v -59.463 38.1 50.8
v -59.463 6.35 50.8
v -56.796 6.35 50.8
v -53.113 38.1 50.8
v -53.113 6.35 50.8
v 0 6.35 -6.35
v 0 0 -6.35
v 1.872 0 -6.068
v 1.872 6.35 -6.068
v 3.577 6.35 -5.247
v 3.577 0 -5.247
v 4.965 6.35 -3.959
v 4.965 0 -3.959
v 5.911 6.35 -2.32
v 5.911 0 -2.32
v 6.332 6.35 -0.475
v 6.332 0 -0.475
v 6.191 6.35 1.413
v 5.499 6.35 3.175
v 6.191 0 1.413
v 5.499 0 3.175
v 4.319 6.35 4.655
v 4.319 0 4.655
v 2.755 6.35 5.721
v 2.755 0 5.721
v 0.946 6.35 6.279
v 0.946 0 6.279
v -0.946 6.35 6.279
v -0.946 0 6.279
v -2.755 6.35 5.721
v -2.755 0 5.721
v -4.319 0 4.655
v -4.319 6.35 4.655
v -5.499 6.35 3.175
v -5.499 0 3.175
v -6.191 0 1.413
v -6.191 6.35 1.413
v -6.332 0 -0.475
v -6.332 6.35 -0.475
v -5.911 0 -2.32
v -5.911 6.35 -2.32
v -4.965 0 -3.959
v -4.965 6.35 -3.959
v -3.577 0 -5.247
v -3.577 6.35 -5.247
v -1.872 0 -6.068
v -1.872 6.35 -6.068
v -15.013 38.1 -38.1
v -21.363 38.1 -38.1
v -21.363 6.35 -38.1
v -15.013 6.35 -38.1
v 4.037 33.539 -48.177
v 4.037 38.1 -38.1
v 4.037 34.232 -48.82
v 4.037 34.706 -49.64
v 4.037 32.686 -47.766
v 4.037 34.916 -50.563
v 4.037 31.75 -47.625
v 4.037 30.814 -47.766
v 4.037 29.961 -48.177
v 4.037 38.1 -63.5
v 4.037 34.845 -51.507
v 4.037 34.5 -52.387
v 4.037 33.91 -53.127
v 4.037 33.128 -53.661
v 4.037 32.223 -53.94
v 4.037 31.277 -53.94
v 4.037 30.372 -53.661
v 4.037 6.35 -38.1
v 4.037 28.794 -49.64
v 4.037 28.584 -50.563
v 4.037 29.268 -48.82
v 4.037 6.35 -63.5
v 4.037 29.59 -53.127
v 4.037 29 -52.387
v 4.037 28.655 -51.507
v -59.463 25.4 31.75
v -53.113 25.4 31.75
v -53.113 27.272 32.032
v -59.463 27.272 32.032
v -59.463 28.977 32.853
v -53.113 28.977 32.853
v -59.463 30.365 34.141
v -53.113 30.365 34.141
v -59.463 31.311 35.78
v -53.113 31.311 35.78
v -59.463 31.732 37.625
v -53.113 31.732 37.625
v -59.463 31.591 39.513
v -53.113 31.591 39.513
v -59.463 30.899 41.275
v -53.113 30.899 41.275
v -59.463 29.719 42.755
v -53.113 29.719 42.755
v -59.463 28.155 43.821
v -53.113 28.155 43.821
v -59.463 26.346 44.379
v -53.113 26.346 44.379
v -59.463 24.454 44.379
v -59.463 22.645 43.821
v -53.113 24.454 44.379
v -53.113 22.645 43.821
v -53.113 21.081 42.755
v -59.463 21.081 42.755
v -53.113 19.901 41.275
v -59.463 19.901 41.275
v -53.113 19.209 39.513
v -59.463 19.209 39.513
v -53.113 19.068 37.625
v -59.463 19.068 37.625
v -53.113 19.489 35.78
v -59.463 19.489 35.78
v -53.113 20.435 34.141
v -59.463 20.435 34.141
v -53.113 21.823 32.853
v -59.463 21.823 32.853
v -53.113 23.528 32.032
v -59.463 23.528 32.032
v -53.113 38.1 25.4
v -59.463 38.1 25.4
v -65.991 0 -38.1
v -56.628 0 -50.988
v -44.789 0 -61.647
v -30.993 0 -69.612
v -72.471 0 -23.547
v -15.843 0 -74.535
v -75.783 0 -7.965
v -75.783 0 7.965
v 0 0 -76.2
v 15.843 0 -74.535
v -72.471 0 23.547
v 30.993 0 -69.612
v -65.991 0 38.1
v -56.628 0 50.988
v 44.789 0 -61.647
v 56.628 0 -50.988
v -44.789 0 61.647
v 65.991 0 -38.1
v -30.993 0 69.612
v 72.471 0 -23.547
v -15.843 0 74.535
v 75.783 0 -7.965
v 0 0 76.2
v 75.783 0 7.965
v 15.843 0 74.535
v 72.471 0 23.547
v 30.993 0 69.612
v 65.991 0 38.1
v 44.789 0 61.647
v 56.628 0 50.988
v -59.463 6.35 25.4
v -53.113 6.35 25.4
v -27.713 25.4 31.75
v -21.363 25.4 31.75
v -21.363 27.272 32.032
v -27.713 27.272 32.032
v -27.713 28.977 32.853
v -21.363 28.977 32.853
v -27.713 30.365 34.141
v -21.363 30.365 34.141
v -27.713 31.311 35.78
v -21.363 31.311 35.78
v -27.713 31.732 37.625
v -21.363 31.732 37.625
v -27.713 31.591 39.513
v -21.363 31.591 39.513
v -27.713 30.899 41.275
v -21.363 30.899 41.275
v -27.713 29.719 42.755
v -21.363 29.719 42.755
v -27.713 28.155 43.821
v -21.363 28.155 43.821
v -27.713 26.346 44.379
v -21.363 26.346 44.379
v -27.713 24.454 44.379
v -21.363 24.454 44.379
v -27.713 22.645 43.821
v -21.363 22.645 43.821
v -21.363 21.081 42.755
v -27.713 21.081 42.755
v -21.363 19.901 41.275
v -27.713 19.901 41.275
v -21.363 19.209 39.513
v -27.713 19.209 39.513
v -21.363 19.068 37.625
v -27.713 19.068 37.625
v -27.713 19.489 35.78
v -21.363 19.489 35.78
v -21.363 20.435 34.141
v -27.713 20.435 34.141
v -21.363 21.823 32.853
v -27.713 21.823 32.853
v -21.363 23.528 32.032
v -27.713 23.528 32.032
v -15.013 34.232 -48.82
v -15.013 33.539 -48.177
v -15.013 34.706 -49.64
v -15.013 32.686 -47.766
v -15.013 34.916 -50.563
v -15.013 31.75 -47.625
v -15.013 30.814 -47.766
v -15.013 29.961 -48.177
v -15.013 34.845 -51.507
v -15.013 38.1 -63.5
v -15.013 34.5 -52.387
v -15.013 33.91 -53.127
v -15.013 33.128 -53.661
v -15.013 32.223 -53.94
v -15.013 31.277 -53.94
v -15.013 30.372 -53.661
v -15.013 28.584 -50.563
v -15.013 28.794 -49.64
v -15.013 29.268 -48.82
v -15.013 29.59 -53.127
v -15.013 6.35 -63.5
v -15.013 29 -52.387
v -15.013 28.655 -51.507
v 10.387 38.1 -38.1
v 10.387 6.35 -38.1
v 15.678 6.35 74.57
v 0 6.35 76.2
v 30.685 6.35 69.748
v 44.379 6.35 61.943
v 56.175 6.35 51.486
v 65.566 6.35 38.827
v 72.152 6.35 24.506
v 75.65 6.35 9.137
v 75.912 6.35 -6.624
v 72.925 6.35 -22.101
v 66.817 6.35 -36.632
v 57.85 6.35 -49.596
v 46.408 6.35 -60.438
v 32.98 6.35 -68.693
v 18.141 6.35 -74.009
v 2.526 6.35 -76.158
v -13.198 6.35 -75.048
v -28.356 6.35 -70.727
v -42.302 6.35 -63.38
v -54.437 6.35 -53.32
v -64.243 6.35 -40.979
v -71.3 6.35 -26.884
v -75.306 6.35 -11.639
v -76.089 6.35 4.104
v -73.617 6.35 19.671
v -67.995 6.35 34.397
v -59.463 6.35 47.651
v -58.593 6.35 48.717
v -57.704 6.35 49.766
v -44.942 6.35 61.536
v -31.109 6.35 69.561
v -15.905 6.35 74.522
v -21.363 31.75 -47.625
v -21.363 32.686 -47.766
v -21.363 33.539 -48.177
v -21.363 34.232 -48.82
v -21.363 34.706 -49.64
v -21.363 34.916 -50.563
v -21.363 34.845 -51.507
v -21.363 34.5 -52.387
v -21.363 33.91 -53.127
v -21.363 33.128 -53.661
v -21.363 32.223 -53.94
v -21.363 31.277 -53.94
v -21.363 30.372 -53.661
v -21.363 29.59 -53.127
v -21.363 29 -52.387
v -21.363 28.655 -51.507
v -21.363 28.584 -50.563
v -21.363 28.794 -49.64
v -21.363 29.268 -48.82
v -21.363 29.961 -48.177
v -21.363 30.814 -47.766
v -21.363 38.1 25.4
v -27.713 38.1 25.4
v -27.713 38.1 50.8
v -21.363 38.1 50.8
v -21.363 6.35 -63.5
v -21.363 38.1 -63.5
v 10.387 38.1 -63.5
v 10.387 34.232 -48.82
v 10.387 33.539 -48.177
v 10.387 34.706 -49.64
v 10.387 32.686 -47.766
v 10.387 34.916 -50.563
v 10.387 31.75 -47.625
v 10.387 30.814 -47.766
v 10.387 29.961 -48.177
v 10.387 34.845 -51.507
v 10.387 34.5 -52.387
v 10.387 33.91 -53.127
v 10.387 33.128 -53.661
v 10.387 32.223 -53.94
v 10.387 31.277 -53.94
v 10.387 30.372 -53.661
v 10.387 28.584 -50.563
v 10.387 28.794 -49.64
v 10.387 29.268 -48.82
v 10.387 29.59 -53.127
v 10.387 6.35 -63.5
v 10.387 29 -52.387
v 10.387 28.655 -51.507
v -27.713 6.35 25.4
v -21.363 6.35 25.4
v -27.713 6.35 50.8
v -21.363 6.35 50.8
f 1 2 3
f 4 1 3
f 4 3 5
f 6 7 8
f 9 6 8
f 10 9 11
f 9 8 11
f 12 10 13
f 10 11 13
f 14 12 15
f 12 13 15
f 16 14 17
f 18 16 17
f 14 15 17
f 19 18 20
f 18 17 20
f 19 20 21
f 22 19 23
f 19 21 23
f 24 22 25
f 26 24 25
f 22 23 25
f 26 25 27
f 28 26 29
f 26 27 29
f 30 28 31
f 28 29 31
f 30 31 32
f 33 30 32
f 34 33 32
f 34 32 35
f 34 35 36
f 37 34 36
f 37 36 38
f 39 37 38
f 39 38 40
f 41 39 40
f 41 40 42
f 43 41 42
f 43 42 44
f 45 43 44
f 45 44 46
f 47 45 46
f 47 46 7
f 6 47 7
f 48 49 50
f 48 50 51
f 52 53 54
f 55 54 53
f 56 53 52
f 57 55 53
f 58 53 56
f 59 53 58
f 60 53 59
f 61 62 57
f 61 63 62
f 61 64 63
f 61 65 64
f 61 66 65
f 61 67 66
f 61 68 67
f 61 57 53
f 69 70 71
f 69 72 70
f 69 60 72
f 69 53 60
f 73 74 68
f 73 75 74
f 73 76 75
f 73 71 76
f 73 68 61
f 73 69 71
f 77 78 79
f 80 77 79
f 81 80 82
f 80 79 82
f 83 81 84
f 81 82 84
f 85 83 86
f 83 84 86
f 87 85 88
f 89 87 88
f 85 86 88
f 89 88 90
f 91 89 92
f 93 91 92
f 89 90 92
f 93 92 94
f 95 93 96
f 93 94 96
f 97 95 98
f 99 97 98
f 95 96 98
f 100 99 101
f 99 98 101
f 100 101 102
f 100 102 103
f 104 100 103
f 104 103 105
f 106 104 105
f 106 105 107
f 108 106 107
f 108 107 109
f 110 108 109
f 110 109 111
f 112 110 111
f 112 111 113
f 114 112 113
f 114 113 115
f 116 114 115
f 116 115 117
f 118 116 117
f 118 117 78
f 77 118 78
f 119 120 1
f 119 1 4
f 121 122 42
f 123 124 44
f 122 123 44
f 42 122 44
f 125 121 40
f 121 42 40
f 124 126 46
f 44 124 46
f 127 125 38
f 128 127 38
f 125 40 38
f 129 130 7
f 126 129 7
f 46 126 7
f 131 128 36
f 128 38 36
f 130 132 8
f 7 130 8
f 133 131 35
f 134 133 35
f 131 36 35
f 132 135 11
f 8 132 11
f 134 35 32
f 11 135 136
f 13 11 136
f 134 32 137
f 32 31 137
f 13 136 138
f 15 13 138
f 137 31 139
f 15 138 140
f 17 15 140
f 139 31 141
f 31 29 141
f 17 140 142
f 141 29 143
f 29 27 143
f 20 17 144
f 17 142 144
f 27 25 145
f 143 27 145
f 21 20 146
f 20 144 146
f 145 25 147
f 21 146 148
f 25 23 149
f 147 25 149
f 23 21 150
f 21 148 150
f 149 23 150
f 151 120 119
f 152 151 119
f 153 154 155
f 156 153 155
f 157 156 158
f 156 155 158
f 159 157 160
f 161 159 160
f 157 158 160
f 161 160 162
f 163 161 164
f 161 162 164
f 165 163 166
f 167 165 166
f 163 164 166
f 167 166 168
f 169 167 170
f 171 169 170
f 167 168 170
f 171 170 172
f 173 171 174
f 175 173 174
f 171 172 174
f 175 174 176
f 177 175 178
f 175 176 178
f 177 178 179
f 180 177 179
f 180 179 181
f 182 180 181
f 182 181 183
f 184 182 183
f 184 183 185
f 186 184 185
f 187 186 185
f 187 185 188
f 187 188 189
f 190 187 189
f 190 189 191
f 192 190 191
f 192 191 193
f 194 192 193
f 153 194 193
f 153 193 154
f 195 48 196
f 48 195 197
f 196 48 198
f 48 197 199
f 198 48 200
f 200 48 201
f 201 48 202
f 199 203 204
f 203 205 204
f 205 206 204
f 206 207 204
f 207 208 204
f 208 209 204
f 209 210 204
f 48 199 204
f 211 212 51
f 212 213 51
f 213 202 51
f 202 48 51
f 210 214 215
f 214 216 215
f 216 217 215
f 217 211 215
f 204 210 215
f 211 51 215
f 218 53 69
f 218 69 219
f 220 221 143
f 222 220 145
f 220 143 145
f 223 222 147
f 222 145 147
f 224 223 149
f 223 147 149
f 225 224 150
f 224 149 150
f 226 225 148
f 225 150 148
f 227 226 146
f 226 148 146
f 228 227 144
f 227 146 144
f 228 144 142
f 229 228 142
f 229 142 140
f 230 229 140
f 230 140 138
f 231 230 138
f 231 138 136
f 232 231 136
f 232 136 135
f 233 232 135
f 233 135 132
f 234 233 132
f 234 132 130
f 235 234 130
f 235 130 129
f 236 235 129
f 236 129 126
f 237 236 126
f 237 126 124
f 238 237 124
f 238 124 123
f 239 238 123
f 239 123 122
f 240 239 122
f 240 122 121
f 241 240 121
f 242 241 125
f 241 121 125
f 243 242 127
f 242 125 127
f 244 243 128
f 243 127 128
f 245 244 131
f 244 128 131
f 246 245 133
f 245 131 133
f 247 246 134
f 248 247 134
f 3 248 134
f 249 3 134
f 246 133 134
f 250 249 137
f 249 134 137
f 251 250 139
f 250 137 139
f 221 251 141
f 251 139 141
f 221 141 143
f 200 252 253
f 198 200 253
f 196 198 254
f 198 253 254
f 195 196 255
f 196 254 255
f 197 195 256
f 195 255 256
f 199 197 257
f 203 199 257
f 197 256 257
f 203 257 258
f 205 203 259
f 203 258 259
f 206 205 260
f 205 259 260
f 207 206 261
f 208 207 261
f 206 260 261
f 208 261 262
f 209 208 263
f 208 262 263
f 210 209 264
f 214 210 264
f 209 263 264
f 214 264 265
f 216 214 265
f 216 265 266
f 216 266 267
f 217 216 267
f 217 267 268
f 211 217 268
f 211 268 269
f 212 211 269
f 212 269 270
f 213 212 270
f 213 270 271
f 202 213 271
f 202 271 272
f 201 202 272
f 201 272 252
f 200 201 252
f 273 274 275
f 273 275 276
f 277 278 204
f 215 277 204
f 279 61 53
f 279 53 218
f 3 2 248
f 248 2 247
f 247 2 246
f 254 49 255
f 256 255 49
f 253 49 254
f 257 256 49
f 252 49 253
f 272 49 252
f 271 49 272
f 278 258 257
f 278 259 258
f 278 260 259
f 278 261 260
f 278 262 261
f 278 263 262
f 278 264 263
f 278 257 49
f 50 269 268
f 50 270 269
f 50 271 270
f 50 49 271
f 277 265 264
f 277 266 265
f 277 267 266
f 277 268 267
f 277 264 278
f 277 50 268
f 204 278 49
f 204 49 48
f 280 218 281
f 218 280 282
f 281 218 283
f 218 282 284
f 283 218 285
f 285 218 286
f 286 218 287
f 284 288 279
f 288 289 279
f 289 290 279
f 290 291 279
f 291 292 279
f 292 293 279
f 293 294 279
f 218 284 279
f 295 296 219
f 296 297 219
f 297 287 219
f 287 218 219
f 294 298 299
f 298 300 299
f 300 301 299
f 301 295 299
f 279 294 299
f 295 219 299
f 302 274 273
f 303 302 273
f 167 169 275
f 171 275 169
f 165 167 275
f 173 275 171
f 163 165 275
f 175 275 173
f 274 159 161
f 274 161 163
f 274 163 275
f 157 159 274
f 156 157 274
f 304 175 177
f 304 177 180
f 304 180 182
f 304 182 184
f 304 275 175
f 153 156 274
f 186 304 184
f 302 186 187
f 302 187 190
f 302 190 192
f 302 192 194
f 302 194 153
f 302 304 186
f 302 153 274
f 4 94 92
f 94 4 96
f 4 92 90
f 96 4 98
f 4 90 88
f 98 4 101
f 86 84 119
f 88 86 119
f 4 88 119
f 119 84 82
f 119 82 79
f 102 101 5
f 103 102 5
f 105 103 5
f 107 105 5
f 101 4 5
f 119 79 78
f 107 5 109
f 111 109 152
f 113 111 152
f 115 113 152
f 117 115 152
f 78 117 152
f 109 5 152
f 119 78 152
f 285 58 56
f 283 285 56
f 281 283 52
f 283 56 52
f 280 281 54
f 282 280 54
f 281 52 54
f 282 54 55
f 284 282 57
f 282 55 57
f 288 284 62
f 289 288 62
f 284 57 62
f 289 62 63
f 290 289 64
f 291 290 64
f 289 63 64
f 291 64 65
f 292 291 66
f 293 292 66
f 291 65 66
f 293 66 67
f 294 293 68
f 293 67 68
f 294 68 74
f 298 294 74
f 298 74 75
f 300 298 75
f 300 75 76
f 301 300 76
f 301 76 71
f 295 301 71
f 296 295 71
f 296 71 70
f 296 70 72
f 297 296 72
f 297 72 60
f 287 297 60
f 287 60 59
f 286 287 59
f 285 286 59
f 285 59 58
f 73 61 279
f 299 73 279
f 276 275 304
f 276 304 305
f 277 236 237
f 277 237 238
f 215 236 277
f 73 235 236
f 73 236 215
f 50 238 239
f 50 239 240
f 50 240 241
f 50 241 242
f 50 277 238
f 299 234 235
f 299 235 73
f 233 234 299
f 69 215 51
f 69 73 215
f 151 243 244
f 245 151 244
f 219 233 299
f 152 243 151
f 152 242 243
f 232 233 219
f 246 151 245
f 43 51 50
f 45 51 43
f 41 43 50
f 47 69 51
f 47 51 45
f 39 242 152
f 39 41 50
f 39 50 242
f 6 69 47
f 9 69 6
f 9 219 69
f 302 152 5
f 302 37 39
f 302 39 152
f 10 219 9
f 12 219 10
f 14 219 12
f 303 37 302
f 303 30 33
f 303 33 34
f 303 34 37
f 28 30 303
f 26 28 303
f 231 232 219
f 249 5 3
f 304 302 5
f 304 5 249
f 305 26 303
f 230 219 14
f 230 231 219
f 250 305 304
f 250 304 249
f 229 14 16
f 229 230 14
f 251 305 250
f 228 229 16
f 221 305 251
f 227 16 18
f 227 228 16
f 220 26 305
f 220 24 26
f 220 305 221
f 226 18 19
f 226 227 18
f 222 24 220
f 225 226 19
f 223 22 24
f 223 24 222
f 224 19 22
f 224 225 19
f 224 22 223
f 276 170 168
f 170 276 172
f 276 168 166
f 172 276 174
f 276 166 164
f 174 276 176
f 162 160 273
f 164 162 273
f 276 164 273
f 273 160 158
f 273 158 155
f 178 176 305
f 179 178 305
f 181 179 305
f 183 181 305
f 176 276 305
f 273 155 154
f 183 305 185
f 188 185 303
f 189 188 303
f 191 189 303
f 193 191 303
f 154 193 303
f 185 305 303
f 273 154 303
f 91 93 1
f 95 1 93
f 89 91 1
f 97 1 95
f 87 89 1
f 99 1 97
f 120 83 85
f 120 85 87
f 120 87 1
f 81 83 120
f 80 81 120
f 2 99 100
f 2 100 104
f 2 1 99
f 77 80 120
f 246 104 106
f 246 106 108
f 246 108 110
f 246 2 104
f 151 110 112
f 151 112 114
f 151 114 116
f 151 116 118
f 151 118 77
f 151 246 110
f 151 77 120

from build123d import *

# Parameters (mm, degrees)
SKETCH1_R           = 76.2
BOSS_EXTRUDE1_DEPTH = 6.35
SKETCH2_R           = 6.35
CUT_EXTRUDE1_DEPTH  = 108.95
SKETCH3_W           = 6.35
SKETCH3_H           = 25.4
BOSS_EXTRUDE2_DEPTH = 31.75
CUT_EXTRUDE2_REACH  = 131.524
SKETCH4_R           = 6.35
SKETCH5_W           = 6.35
SKETCH5_H           = 25.4
BOSS_EXTRUDE3_DEPTH = 31.75
CUT_EXTRUDE3_REACH  = 131.524
SKETCH6_R           = 3.175


with BuildPart() as part:
    # Sketch1 → Boss-Extrude1 (new body)
    with BuildSketch(Plane(origin=(0, 0, 0), x_dir=(1, 0, 0), z_dir=(0, 1, 0))):
        with Locations(Location((0, 0, 0), (0, 0, 270))):
            Circle(SKETCH1_R)
    extrude(amount=BOSS_EXTRUDE1_DEPTH)

    # Sketch2 → Cut-Extrude1 (cut, through all)
    with BuildSketch(Plane.XZ):
        with Locations(Location((0, 0, 0), (0, 0, 270))):
            Circle(SKETCH2_R)
    extrude(amount=-CUT_EXTRUDE1_DEPTH, mode=Mode.SUBTRACT)

    # Sketch3 → Boss-Extrude2 (add)
    with BuildSketch(Plane(origin=(0, 6.35, 0), x_dir=(1, 0, 0), z_dir=(0, 1, 0))):
        with Locations((-56.28767, -38.1)):
            Rectangle(SKETCH3_W, SKETCH3_H)
        with Locations((-24.53767, -38.1)):
            Rectangle(SKETCH3_W, SKETCH3_H)
    extrude(amount=BOSS_EXTRUDE2_DEPTH)

    # Cut-Extrude2: up to this face of the body (flat: up to its plane)
    cut_extrude2_end = Plane(part.part.faces().sort_by_distance((-59.46267, 22.225, 38.1))[0])
    # Sketch4 → Cut-Extrude2 (cut, up to the picked face)
    with BuildSketch(Plane(origin=(-21.36267, 0, 0), x_dir=(0, 0, -1), z_dir=(1, 0, 0)), mode=Mode.PRIVATE) as cut_extrude2_sk1:
        with Locations((-38.1, 25.4)):
            Circle(SKETCH4_R)
    cut_extrude2_tool1 = split(extrude(cut_extrude2_sk1.sketch, amount=-CUT_EXTRUDE2_REACH, mode=Mode.PRIVATE), bisect_by=cut_extrude2_end, keep=Keep.BOTH, mode=Mode.PRIVATE)
    add(cut_extrude2_tool1.solids().sort_by(Axis((-21.36267, 25.4, 38.1), (-1, 0, 0)))[0], mode=Mode.SUBTRACT)

    # Sketch5 → Boss-Extrude3 (add)
    with BuildSketch(Plane(origin=(0, 6.35, 0), x_dir=(1, 0, 0), z_dir=(0, 1, 0))):
        with Locations((-18.18767, 50.8)):
            Rectangle(SKETCH5_W, SKETCH5_H)
        with Locations((7.21233, 50.8)):
            Rectangle(SKETCH5_W, SKETCH5_H)
    extrude(amount=BOSS_EXTRUDE3_DEPTH)

    # Cut-Extrude3: up to this face of the body (flat: up to its plane)
    cut_extrude3_end = Plane(part.part.faces().sort_by_distance((10.38733, 22.225, -50.8))[0])
    # Sketch6 → Cut-Extrude3 (cut, up to the picked face)
    with BuildSketch(Plane.ZY.offset(21.36267), mode=Mode.PRIVATE) as cut_extrude3_sk1:
        with Locations((-50.8, 31.75)):
            Circle(SKETCH6_R)
    cut_extrude3_tool1 = split(extrude(cut_extrude3_sk1.sketch, amount=-CUT_EXTRUDE3_REACH, mode=Mode.PRIVATE), bisect_by=cut_extrude3_end, keep=Keep.BOTH, mode=Mode.PRIVATE)
    add(cut_extrude3_tool1.solids().sort_by(Axis((-21.36267, 31.75, -50.8), (1, 0, 0)))[0], mode=Mode.SUBTRACT)


solid = part.part
